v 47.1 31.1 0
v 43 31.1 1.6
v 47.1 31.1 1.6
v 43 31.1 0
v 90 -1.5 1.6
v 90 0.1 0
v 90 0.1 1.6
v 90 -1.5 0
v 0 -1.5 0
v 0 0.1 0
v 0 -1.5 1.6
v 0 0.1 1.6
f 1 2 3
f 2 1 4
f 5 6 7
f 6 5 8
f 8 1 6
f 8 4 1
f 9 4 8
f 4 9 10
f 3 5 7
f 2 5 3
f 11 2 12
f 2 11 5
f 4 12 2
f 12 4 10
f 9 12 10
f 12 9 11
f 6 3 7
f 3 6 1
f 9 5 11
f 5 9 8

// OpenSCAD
$fn = 200;

// bruder_03590_firetruck.scad
// https://github.com/gerald-b/scad_shapes/tree/bruder_03590_firetruck

hull()
{
    translate([0,0,0])    cube([0.1,0.1,1.6]);
    translate([89.9,0,0]) cube([0.1,0.1,1.6]);

    translate([43,31,0])  cube([0.1,0.1,1.6]);
    translate([47,31,0])  cube([0.1,0.1,1.6]);
}
translate([0,-1.5,0]) cube([90,1.5,1.6]);
